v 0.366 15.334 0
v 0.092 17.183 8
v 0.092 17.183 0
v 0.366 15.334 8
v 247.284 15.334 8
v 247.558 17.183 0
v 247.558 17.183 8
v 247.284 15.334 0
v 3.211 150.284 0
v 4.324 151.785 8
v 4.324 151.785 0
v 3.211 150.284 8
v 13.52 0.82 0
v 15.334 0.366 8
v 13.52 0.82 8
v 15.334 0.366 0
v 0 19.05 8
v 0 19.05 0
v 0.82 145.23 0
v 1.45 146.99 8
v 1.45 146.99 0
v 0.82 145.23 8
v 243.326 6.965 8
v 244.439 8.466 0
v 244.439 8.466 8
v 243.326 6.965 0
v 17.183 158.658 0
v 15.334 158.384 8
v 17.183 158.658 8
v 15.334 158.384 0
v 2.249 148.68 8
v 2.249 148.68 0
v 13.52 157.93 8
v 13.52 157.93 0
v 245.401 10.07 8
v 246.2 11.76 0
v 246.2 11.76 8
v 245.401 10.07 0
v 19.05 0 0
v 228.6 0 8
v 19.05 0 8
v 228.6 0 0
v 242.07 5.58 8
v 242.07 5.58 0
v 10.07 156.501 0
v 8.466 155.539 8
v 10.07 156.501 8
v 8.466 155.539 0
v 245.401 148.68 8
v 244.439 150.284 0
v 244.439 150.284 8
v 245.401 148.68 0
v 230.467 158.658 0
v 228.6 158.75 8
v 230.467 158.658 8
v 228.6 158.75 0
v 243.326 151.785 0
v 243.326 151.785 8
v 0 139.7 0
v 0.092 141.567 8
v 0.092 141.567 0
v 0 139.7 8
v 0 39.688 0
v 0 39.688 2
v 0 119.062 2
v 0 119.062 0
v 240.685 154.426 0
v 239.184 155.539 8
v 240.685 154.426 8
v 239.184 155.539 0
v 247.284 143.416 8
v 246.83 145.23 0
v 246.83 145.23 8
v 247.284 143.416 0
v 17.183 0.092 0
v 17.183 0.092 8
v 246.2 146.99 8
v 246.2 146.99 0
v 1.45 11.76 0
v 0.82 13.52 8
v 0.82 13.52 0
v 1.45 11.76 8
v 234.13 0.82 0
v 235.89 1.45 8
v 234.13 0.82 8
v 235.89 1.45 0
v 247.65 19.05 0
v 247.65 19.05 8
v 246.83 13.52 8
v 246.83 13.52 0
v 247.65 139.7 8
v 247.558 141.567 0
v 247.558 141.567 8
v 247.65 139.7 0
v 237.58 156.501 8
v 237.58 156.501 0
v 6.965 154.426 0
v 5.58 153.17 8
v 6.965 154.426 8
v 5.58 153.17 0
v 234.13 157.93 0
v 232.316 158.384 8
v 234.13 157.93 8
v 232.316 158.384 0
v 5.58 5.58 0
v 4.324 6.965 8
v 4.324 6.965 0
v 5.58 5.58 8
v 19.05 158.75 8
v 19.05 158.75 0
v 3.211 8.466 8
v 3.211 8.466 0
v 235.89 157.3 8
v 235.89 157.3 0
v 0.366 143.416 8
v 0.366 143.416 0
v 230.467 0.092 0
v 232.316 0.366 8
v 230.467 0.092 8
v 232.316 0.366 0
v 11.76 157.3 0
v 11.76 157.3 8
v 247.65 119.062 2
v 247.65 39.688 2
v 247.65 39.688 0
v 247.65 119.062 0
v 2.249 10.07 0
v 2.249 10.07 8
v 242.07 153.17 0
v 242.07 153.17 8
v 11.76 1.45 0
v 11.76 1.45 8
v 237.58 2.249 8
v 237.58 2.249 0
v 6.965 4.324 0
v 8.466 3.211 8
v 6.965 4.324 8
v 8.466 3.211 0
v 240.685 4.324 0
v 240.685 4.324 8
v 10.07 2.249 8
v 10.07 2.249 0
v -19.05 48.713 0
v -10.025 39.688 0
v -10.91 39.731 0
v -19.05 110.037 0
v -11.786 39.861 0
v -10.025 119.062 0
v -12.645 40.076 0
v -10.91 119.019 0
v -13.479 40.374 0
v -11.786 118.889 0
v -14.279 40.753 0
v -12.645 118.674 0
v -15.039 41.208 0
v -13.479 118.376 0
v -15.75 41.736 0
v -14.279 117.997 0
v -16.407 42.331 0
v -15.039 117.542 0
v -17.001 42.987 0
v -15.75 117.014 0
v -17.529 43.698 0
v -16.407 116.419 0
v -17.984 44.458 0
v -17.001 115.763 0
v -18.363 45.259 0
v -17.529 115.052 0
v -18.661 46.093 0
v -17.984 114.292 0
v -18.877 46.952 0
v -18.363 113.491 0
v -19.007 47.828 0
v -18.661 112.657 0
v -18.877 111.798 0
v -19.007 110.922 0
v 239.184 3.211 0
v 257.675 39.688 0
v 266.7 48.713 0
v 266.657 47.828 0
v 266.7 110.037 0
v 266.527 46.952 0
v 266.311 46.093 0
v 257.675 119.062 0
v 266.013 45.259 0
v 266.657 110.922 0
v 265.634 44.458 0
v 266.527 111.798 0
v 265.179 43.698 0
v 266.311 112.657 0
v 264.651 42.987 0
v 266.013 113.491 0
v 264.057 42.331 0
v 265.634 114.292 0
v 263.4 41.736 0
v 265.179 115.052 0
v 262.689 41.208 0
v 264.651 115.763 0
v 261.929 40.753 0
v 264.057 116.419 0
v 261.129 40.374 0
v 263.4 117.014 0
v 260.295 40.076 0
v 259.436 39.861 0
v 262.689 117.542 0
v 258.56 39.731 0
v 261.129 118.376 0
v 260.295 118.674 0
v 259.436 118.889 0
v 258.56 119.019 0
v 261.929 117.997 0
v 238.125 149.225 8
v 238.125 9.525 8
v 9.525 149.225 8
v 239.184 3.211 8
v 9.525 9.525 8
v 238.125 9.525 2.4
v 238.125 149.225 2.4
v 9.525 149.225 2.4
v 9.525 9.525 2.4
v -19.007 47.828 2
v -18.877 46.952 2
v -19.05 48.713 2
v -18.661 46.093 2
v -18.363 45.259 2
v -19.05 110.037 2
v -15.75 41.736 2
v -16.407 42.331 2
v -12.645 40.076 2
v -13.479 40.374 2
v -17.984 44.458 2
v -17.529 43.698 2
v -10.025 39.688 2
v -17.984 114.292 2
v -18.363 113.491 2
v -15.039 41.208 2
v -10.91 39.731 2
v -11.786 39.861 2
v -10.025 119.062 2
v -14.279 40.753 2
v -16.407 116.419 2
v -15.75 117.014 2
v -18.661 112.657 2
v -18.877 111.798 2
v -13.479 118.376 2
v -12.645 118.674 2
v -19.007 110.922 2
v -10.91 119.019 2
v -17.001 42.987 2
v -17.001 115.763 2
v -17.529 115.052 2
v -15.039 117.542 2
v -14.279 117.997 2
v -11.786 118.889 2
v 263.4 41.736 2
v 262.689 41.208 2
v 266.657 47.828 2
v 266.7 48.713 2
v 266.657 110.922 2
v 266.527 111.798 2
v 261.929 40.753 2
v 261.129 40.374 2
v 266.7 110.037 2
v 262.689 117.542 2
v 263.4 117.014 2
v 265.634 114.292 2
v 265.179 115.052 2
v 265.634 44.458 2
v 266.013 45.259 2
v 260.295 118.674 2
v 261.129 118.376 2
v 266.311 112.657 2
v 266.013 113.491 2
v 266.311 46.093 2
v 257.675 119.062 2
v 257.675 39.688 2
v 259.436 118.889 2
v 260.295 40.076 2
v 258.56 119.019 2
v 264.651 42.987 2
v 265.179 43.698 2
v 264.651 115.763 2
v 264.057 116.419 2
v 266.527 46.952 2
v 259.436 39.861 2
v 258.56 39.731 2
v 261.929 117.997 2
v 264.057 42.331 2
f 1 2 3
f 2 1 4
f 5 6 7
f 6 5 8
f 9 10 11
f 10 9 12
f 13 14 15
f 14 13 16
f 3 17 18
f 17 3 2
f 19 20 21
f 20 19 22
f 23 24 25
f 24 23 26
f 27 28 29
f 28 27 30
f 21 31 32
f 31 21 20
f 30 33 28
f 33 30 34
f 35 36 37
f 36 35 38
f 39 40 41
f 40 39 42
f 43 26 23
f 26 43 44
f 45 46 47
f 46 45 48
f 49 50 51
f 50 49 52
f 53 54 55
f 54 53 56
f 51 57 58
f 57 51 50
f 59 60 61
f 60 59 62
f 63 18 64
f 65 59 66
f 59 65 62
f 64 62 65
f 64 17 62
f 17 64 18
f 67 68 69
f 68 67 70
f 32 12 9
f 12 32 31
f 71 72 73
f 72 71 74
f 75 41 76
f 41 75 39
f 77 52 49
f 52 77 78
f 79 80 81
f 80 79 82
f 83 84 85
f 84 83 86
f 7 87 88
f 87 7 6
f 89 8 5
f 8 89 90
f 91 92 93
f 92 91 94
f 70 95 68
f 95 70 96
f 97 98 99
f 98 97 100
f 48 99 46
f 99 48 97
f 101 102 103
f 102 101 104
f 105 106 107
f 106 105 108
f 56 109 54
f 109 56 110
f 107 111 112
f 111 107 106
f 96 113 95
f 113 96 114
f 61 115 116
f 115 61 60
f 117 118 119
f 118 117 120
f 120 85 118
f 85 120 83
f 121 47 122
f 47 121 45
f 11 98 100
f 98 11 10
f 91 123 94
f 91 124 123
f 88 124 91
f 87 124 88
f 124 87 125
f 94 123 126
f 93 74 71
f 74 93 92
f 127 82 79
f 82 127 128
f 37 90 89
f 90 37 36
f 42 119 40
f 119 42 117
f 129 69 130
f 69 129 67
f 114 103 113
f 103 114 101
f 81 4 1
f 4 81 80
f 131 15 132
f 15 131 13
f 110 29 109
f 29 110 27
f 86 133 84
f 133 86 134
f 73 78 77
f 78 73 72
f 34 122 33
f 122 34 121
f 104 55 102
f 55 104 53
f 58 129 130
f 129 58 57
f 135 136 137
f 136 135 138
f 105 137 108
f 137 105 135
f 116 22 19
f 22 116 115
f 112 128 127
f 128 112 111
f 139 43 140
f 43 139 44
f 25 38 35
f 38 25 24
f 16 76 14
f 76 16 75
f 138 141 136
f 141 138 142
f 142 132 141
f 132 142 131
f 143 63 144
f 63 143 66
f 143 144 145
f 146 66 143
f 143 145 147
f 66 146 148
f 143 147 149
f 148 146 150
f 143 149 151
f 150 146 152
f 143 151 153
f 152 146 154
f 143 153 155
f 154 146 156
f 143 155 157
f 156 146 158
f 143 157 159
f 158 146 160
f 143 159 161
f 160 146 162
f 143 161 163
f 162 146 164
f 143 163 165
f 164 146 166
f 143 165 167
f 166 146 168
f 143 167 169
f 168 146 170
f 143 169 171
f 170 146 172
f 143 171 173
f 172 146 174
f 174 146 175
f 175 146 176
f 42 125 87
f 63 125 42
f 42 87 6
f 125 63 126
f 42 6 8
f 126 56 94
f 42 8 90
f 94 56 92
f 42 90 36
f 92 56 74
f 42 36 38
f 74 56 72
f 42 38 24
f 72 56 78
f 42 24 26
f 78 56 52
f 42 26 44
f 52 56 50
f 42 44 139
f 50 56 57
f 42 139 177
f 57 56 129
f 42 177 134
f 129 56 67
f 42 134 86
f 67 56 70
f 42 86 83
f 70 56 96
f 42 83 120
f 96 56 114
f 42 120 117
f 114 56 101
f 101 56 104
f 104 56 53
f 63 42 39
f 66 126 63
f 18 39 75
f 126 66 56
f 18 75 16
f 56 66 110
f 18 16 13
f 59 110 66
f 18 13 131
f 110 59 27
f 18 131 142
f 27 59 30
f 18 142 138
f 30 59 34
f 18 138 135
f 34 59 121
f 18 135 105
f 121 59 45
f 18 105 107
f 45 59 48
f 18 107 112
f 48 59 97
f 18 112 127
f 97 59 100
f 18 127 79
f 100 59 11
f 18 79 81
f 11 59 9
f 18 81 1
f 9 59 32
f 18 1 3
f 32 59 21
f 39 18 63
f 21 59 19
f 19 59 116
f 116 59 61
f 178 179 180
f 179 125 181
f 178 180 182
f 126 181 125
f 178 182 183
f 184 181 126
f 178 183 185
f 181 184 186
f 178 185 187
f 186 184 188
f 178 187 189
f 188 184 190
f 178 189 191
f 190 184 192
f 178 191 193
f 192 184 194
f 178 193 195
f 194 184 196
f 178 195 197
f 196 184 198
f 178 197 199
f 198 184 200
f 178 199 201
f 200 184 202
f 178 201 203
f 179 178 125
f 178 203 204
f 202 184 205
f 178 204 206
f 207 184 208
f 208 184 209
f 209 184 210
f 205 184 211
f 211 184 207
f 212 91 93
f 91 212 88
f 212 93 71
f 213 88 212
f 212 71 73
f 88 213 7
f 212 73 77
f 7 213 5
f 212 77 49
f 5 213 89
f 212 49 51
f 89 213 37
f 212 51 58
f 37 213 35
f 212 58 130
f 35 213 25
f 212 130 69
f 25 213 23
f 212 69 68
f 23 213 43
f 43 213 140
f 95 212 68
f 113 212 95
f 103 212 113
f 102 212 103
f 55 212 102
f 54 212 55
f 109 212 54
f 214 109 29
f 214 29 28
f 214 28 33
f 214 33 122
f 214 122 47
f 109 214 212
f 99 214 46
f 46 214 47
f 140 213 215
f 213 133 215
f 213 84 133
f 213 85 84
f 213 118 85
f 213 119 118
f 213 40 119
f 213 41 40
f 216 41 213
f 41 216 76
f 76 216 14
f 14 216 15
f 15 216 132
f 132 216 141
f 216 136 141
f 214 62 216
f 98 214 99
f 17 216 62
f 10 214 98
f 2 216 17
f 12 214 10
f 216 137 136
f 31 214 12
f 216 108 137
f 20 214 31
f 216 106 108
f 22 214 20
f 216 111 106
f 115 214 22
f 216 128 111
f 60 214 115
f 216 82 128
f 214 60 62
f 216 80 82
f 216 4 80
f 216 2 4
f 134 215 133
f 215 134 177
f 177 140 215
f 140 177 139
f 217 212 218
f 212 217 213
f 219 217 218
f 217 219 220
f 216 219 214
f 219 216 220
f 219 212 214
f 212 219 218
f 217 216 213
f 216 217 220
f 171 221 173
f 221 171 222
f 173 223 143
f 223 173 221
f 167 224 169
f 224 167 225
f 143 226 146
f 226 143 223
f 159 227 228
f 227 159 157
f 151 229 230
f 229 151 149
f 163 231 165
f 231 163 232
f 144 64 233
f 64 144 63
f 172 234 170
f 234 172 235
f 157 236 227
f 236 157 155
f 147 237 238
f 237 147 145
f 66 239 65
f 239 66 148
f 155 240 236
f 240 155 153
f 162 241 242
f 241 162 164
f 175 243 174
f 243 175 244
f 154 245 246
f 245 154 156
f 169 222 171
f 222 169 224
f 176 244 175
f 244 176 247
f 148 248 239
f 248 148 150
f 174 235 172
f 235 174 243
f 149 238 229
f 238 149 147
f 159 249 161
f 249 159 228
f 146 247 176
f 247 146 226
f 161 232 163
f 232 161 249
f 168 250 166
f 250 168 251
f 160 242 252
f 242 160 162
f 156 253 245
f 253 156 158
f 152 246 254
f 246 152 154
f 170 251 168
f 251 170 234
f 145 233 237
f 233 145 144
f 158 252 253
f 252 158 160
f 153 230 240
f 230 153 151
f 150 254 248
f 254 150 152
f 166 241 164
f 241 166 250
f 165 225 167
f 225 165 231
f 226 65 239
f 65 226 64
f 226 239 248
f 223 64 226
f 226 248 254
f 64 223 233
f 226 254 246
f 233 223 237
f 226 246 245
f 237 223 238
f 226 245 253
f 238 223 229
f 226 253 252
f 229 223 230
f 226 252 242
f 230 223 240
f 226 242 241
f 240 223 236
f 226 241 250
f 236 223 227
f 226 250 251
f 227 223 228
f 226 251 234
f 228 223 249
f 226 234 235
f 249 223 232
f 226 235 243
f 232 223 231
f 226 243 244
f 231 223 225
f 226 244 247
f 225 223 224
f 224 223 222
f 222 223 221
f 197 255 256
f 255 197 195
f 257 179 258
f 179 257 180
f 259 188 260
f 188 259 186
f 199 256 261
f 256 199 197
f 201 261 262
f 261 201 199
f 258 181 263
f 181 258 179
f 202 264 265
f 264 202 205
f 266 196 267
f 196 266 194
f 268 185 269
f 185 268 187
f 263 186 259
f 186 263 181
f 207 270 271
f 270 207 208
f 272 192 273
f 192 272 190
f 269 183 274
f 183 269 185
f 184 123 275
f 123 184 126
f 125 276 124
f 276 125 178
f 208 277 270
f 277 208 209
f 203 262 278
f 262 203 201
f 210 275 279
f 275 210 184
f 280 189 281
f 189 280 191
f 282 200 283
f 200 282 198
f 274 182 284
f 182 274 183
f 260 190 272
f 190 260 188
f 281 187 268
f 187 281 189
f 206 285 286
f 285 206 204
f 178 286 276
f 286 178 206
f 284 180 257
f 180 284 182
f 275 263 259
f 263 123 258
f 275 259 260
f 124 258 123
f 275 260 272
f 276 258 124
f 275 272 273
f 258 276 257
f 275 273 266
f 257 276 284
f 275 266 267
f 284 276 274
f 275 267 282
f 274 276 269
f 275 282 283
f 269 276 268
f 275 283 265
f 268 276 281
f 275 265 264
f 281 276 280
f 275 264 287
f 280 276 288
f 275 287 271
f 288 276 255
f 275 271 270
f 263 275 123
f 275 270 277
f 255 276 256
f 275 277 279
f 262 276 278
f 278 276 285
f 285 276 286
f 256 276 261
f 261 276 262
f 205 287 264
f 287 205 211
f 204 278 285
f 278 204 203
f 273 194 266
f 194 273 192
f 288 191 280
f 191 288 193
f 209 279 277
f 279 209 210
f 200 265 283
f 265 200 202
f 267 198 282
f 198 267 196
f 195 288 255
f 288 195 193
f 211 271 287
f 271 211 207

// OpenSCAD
// file: model-forge/model-forge/tray.scad
// model-forge/tray.scad — rounded-corner outer panel with a recessed
// inset pocket (e.g. a "cooking dish" recess): a raised rim around the
// edge, floor thickness under the pocket, and an optional thin lip
// flange around the base — sized to slide into a support-rail groove
// (like the wooden rails inside the real Tiny Land oven cavity) rather
// than just resting loose.
//
//   use <model-forge/tray.scad>
//   rounded_tray(outer_width=285.75, outer_height=228.6, corner_radius=25.4,
//                floor_thickness=5.08, rim_height=3.81, inset_margin=6.35,
//                lip_width=3, lip_thickness=2);
//
// Shape: outer_width x outer_height slab, rounded corners (corner_radius),
// total height = floor_thickness + rim_height. A pocket is cut from the
// top, inset_margin in from every edge, cutting down through rim_height
// and stopping at floor_thickness from the bottom — so floor_thickness is
// what's left under the pocket, rim_height is how tall the surrounding
// wall stands above the pocket floor.
//
// The lip (lip_width/lip_thickness) is a thin flange at the TOP of the
// rim (from total_height-lip_thickness to total_height), sticking out
// lip_width beyond the main body on every side — corrected 2026-09-11
// per feedback on the real rail photo: the groove is near the top of the
// cavity wall, not the bottom. Both default to 0 (no lip) so existing
// calls keep working unchanged.

// hull-of-4-circles rounded rect — much faster to render than a
// minkowski-based approach for this shape (no minkowski sum needed).
module rounded_rect_2d(w, h, r) {
  hull() {
    translate([r, r]) circle(r = r, $fn = 64);
    translate([w - r, r]) circle(r = r, $fn = 64);
    translate([r, h - r]) circle(r = r, $fn = 64);
    translate([w - r, h - r]) circle(r = r, $fn = 64);
  }
}

module rounded_tray(
  outer_width,
  outer_height,
  corner_radius,
  floor_thickness,
  rim_height,
  inset_margin,
  lip_width = 0,
  lip_thickness = 0
) {
  total_height = floor_thickness + rim_height;

  union() {
    if (lip_width > 0 && lip_thickness > 0) {
      translate([-lip_width, -lip_width, total_height - lip_thickness])
        linear_extrude(height = lip_thickness)
          rounded_rect_2d(outer_width + 2 * lip_width, outer_height + 2 * lip_width, corner_radius + lip_width);
    }
    difference() {
      linear_extrude(height = total_height)
        rounded_rect_2d(outer_width, outer_height, corner_radius);
      translate([inset_margin, inset_margin, floor_thickness])
        cube([outer_width - 2 * inset_margin, outer_height - 2 * inset_margin, rim_height + 1]);
    }
  }
}
// file: model-forge/baking_sheet.scad
// model-forge/baking_sheet.scad — a rounded pan with handle tabs on both
// short ends, driven by just 5 "super simple" variables: pan_width and
// pan_height (the pan body, NOT including the handles), handle_size (how
// far each handle protrudes), handle_thickness, and pan_depth. Everything
// else — corner rounding, floor thickness, handle width/rounding, pocket
// inset — is a fixed proportion derived from those, per the user's own
// framing: "the rest scales with it, rounding etc."
//
//   use <model-forge/baking_sheet.scad>
//   baking_sheet(pan_width=247.7, pan_height=158.75, handle_size=19,
//                handle_thickness=2, pan_depth=8);
//
// Total footprint including both handles = pan_width + 2*handle_size.
// Modeled after a real paper template the user already test-fit
// (projects/tinyland-playset-kitchen/reference-photos/) at 11.25x6.25in
// overall — pan_width/handle_size below are back-derived from that
// (11.25in total, 0.75in handles each side -> pan_width = 9.75in body).
use <model-forge/tray.scad>

module baking_sheet(pan_width, pan_height, handle_size, handle_thickness, pan_depth) {
  // Fixed proportions — not exposed as separate variables on purpose.
  corner_radius   = min(pan_width, pan_height) * 0.12;
  floor_thickness = pan_depth * 0.3;
  rim_height      = pan_depth * 0.7;
  inset_margin    = corner_radius * 0.5;
  handle_width    = pan_height * 0.5;
  handle_radius   = min(corner_radius, handle_width / 2 - 0.5, handle_size / 2 - 0.5);

  union() {
    rounded_tray(
      outer_width = pan_width,
      outer_height = pan_height,
      corner_radius = corner_radius,
      floor_thickness = floor_thickness,
      rim_height = rim_height,
      inset_margin = inset_margin
    );
    // Handle on the left short edge — extends into negative X.
    translate([-handle_size, (pan_height - handle_width) / 2, 0])
      linear_extrude(height = handle_thickness)
        rounded_rect_2d(handle_size + corner_radius, handle_width, handle_radius);
    // Handle on the right short edge.
    translate([pan_width - corner_radius, (pan_height - handle_width) / 2, 0])
      linear_extrude(height = handle_thickness)
        rounded_rect_2d(handle_size + corner_radius, handle_width, handle_radius);
  }
}
// main file
// Tiny Land baking sheet with handles — matches the paper template
// (11.25 x 6.25in overall). Standalone, printable file.
// View > Show Customizer for sliders. Per the design: only 5 "super
// simple" variables drive the pan itself (pan_width/height, handle_size,
// handle_thickness, pan_depth) — corner rounding, floor thickness, and
// handle width all scale automatically. handle_hole_margin_mm controls
// the hand-grip loop cutout.
use <model-forge/baking_sheet.scad>

/* [Pan — inches] */
pan_width_in  = 9.75;  // body only, NOT including handles (total with handles = pan_width_in + 2*handle_size_in)
pan_height_in = 6.25;

/* [Handles] */
handle_size_in       = 0.75; // [0.25:0.05:2]   how far each handle protrudes
handle_thickness_mm  = 2;    // [0.5:0.5:6]
handle_hole_margin_mm = -1;  // [-1:0.5:15]  -1 = auto-scaled loop thickness; 0 = solid tab, no cutout

/* [Pan depth] */
pan_depth_mm = 8; // [2:1:20]  controls floor + rim thickness together

IN_TO_MM = 25.4;

baking_sheet(
  pan_width          = pan_width_in * IN_TO_MM,
  pan_height         = pan_height_in * IN_TO_MM,
  handle_size        = handle_size_in * IN_TO_MM,
  handle_thickness   = handle_thickness_mm,
  pan_depth          = pan_depth_mm,
  handle_hole_margin = handle_hole_margin_mm
);
